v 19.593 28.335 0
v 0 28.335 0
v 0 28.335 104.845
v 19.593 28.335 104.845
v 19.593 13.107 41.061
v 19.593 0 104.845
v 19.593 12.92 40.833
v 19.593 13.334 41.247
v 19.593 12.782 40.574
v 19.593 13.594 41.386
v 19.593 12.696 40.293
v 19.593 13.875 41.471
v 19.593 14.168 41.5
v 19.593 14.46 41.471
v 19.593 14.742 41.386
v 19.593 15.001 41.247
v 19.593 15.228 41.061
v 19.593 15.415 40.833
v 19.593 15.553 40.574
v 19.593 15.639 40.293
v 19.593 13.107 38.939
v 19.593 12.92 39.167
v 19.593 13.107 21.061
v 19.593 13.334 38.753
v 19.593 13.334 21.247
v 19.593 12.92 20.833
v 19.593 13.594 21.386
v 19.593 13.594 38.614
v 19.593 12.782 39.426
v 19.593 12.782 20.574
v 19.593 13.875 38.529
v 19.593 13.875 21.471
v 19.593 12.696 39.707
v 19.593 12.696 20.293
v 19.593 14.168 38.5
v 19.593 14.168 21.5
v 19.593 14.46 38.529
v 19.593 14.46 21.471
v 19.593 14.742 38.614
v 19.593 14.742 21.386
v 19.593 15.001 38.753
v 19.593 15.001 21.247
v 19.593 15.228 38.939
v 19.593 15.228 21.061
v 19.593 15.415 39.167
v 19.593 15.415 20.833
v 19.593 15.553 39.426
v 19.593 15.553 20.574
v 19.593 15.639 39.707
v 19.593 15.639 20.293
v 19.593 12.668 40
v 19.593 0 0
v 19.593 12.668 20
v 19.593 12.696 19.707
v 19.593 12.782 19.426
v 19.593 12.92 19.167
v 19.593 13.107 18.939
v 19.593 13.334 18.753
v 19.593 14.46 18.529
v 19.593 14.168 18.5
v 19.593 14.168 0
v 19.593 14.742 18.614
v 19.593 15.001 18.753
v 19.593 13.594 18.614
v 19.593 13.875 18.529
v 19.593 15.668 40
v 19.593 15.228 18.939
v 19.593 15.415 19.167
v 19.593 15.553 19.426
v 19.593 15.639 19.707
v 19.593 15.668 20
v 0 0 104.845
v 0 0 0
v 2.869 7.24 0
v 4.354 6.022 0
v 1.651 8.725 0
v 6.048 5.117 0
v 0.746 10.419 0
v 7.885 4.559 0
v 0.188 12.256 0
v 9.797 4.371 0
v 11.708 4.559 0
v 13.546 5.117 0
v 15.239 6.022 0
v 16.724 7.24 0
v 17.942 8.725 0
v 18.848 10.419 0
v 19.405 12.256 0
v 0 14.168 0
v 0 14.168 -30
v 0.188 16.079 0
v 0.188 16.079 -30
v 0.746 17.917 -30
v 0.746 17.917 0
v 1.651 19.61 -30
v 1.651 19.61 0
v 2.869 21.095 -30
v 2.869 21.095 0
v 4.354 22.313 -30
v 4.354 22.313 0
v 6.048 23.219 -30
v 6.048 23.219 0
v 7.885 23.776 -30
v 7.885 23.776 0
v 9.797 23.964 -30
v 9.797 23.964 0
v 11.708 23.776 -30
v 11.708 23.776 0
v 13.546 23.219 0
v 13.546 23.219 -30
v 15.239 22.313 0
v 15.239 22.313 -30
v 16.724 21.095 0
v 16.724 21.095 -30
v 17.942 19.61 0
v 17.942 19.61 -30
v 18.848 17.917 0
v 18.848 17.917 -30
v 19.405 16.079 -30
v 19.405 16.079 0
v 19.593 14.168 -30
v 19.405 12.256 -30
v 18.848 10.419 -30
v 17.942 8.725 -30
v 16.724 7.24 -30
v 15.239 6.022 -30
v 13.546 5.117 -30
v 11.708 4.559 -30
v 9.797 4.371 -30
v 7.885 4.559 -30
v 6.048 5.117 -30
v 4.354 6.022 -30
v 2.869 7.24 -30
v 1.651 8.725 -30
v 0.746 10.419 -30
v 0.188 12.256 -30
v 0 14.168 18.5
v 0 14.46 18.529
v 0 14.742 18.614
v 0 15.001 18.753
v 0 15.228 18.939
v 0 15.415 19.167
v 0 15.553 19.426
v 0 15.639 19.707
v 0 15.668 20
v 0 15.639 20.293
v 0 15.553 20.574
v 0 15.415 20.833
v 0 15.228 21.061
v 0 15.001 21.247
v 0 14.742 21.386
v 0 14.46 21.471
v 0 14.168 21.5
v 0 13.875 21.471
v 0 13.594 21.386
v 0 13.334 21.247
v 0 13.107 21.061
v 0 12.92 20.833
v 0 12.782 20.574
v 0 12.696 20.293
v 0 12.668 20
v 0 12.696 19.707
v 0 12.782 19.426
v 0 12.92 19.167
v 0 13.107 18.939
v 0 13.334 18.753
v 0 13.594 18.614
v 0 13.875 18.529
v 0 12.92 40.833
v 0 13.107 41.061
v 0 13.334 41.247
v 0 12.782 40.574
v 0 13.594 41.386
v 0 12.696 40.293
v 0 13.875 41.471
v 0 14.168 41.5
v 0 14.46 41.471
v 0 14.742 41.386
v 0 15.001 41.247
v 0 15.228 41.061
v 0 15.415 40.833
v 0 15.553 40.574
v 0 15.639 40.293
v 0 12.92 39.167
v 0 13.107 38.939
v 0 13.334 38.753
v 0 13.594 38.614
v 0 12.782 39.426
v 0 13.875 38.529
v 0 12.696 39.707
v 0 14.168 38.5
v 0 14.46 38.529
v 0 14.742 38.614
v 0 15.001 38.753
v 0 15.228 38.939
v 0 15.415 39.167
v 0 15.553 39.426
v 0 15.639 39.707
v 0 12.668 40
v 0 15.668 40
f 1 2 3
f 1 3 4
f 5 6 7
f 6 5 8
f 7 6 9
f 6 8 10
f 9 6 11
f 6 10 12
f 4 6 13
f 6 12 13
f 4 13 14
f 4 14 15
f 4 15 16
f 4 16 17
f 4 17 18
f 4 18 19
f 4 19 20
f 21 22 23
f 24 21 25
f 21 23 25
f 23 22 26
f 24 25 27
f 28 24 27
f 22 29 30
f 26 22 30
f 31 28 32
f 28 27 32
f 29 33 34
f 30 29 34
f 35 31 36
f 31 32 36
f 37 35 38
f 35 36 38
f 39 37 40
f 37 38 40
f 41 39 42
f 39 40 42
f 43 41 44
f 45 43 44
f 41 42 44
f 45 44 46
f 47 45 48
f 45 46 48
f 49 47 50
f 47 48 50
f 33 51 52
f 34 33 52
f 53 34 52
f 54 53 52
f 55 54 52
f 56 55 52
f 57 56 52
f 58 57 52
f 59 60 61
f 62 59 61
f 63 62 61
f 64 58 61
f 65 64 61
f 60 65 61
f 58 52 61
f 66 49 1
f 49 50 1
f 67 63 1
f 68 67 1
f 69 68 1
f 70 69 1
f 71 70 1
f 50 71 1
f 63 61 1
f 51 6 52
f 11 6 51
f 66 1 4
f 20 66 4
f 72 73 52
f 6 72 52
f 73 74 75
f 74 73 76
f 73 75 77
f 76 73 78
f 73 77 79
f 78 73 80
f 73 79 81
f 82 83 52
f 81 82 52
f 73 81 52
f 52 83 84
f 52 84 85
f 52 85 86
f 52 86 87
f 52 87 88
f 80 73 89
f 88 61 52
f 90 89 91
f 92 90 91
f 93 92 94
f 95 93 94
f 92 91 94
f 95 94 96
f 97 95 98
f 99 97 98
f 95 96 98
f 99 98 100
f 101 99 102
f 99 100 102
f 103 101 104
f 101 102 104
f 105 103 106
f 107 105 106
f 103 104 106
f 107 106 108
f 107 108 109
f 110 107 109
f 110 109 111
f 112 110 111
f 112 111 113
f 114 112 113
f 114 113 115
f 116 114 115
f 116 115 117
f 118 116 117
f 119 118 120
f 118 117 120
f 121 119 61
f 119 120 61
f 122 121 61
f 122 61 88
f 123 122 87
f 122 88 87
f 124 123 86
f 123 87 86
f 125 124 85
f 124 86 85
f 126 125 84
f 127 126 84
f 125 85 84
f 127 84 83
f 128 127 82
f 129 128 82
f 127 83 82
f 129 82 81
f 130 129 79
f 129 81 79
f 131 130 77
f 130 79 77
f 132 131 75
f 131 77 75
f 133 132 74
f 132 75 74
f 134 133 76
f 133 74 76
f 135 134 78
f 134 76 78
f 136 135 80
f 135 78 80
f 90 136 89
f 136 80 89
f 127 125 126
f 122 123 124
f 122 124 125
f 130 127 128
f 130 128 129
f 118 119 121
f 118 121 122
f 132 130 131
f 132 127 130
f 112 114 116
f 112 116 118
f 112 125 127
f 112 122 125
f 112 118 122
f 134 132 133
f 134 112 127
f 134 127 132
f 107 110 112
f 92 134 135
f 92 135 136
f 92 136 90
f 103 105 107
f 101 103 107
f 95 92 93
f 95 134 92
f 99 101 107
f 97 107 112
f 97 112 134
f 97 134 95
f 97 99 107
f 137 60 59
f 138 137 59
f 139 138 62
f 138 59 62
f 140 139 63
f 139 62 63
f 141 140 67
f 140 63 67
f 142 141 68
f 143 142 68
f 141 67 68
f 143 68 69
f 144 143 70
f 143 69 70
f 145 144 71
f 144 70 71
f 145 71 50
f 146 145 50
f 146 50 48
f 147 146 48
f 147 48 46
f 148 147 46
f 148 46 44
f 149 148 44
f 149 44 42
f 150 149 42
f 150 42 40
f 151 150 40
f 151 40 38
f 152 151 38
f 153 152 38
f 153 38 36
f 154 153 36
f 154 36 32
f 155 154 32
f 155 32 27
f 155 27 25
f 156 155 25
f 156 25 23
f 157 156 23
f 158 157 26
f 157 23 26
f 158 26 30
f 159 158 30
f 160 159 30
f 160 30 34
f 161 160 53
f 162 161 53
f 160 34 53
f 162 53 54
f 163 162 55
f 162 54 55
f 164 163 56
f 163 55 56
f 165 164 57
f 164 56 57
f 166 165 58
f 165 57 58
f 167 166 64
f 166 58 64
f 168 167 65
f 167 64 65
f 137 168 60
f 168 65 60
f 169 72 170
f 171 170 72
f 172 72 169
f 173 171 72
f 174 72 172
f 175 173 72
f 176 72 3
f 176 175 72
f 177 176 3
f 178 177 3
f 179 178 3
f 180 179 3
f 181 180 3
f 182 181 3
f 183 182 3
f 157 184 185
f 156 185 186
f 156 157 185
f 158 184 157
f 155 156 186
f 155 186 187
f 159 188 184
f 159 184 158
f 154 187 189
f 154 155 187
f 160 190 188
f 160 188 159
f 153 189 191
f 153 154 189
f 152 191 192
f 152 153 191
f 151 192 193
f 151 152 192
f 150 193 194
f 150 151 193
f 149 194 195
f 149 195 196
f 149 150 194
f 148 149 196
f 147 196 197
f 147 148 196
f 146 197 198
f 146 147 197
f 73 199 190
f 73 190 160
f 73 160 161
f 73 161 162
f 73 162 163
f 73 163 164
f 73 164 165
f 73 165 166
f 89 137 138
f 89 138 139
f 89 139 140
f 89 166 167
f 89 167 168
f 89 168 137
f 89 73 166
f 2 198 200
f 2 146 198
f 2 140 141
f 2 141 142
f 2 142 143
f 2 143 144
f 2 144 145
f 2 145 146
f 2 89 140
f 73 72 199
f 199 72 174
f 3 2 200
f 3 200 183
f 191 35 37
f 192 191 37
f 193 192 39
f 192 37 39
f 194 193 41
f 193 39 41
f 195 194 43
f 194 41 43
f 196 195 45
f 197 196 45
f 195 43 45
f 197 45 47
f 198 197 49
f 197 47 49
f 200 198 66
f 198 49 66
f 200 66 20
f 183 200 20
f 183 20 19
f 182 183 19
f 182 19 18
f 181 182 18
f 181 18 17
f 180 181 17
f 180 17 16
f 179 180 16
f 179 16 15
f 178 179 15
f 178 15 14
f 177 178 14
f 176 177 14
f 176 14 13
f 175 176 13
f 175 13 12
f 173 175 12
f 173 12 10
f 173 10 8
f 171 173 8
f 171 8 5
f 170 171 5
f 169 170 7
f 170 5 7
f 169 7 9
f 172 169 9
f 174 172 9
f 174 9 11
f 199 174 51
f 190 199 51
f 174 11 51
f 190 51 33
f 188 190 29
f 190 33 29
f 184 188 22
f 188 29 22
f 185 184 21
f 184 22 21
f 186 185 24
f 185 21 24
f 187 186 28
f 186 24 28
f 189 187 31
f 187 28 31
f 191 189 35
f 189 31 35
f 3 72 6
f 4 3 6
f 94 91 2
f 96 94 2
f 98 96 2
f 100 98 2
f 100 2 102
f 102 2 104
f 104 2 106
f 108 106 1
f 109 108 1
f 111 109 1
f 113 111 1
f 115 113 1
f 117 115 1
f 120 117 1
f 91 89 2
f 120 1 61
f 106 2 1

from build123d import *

# Parameters (mm, degrees)
SKETCH1_W           = 19.59343046
SKETCH1_H           = 28.33511482
BOSS_EXTRUDE1_DEPTH = 104.84505691
SKETCH2_R           = 9.79671523
BOSS_EXTRUDE2_DEPTH = 30
SKETCH3_R           = 1.5
CUT_EXTRUDE1_DEPTH  = 111.359717323


with BuildPart() as part:
    # Sketch1 → Boss-Extrude1 (new body)
    with BuildSketch(Plane.XY):
        with Locations((9.79671523, 14.16755741)):
            Rectangle(SKETCH1_W, SKETCH1_H)
    extrude(amount=BOSS_EXTRUDE1_DEPTH)

    # Sketch2 → Boss-Extrude2 (add)
    with BuildSketch(Plane(origin=(0, 0, 0), x_dir=(-1, 0, 0), z_dir=(0, 0, -1))):
        with Locations((-9.79671523, 14.16755741)):
            Circle(SKETCH2_R)
    extrude(amount=BOSS_EXTRUDE2_DEPTH)

    # Sketch3 → Cut-Extrude1 (cut, through all)
    with BuildSketch(Plane(origin=(19.59343046, 0, 0), x_dir=(0, 0, -1), z_dir=(1, 0, 0))):
        with Locations((-20, 14.16755741)):
            Circle(SKETCH3_R)
        with Locations((-40, 14.16755741)):
            Circle(SKETCH3_R)
    extrude(amount=-CUT_EXTRUDE1_DEPTH, mode=Mode.SUBTRACT)


solid = part.part
